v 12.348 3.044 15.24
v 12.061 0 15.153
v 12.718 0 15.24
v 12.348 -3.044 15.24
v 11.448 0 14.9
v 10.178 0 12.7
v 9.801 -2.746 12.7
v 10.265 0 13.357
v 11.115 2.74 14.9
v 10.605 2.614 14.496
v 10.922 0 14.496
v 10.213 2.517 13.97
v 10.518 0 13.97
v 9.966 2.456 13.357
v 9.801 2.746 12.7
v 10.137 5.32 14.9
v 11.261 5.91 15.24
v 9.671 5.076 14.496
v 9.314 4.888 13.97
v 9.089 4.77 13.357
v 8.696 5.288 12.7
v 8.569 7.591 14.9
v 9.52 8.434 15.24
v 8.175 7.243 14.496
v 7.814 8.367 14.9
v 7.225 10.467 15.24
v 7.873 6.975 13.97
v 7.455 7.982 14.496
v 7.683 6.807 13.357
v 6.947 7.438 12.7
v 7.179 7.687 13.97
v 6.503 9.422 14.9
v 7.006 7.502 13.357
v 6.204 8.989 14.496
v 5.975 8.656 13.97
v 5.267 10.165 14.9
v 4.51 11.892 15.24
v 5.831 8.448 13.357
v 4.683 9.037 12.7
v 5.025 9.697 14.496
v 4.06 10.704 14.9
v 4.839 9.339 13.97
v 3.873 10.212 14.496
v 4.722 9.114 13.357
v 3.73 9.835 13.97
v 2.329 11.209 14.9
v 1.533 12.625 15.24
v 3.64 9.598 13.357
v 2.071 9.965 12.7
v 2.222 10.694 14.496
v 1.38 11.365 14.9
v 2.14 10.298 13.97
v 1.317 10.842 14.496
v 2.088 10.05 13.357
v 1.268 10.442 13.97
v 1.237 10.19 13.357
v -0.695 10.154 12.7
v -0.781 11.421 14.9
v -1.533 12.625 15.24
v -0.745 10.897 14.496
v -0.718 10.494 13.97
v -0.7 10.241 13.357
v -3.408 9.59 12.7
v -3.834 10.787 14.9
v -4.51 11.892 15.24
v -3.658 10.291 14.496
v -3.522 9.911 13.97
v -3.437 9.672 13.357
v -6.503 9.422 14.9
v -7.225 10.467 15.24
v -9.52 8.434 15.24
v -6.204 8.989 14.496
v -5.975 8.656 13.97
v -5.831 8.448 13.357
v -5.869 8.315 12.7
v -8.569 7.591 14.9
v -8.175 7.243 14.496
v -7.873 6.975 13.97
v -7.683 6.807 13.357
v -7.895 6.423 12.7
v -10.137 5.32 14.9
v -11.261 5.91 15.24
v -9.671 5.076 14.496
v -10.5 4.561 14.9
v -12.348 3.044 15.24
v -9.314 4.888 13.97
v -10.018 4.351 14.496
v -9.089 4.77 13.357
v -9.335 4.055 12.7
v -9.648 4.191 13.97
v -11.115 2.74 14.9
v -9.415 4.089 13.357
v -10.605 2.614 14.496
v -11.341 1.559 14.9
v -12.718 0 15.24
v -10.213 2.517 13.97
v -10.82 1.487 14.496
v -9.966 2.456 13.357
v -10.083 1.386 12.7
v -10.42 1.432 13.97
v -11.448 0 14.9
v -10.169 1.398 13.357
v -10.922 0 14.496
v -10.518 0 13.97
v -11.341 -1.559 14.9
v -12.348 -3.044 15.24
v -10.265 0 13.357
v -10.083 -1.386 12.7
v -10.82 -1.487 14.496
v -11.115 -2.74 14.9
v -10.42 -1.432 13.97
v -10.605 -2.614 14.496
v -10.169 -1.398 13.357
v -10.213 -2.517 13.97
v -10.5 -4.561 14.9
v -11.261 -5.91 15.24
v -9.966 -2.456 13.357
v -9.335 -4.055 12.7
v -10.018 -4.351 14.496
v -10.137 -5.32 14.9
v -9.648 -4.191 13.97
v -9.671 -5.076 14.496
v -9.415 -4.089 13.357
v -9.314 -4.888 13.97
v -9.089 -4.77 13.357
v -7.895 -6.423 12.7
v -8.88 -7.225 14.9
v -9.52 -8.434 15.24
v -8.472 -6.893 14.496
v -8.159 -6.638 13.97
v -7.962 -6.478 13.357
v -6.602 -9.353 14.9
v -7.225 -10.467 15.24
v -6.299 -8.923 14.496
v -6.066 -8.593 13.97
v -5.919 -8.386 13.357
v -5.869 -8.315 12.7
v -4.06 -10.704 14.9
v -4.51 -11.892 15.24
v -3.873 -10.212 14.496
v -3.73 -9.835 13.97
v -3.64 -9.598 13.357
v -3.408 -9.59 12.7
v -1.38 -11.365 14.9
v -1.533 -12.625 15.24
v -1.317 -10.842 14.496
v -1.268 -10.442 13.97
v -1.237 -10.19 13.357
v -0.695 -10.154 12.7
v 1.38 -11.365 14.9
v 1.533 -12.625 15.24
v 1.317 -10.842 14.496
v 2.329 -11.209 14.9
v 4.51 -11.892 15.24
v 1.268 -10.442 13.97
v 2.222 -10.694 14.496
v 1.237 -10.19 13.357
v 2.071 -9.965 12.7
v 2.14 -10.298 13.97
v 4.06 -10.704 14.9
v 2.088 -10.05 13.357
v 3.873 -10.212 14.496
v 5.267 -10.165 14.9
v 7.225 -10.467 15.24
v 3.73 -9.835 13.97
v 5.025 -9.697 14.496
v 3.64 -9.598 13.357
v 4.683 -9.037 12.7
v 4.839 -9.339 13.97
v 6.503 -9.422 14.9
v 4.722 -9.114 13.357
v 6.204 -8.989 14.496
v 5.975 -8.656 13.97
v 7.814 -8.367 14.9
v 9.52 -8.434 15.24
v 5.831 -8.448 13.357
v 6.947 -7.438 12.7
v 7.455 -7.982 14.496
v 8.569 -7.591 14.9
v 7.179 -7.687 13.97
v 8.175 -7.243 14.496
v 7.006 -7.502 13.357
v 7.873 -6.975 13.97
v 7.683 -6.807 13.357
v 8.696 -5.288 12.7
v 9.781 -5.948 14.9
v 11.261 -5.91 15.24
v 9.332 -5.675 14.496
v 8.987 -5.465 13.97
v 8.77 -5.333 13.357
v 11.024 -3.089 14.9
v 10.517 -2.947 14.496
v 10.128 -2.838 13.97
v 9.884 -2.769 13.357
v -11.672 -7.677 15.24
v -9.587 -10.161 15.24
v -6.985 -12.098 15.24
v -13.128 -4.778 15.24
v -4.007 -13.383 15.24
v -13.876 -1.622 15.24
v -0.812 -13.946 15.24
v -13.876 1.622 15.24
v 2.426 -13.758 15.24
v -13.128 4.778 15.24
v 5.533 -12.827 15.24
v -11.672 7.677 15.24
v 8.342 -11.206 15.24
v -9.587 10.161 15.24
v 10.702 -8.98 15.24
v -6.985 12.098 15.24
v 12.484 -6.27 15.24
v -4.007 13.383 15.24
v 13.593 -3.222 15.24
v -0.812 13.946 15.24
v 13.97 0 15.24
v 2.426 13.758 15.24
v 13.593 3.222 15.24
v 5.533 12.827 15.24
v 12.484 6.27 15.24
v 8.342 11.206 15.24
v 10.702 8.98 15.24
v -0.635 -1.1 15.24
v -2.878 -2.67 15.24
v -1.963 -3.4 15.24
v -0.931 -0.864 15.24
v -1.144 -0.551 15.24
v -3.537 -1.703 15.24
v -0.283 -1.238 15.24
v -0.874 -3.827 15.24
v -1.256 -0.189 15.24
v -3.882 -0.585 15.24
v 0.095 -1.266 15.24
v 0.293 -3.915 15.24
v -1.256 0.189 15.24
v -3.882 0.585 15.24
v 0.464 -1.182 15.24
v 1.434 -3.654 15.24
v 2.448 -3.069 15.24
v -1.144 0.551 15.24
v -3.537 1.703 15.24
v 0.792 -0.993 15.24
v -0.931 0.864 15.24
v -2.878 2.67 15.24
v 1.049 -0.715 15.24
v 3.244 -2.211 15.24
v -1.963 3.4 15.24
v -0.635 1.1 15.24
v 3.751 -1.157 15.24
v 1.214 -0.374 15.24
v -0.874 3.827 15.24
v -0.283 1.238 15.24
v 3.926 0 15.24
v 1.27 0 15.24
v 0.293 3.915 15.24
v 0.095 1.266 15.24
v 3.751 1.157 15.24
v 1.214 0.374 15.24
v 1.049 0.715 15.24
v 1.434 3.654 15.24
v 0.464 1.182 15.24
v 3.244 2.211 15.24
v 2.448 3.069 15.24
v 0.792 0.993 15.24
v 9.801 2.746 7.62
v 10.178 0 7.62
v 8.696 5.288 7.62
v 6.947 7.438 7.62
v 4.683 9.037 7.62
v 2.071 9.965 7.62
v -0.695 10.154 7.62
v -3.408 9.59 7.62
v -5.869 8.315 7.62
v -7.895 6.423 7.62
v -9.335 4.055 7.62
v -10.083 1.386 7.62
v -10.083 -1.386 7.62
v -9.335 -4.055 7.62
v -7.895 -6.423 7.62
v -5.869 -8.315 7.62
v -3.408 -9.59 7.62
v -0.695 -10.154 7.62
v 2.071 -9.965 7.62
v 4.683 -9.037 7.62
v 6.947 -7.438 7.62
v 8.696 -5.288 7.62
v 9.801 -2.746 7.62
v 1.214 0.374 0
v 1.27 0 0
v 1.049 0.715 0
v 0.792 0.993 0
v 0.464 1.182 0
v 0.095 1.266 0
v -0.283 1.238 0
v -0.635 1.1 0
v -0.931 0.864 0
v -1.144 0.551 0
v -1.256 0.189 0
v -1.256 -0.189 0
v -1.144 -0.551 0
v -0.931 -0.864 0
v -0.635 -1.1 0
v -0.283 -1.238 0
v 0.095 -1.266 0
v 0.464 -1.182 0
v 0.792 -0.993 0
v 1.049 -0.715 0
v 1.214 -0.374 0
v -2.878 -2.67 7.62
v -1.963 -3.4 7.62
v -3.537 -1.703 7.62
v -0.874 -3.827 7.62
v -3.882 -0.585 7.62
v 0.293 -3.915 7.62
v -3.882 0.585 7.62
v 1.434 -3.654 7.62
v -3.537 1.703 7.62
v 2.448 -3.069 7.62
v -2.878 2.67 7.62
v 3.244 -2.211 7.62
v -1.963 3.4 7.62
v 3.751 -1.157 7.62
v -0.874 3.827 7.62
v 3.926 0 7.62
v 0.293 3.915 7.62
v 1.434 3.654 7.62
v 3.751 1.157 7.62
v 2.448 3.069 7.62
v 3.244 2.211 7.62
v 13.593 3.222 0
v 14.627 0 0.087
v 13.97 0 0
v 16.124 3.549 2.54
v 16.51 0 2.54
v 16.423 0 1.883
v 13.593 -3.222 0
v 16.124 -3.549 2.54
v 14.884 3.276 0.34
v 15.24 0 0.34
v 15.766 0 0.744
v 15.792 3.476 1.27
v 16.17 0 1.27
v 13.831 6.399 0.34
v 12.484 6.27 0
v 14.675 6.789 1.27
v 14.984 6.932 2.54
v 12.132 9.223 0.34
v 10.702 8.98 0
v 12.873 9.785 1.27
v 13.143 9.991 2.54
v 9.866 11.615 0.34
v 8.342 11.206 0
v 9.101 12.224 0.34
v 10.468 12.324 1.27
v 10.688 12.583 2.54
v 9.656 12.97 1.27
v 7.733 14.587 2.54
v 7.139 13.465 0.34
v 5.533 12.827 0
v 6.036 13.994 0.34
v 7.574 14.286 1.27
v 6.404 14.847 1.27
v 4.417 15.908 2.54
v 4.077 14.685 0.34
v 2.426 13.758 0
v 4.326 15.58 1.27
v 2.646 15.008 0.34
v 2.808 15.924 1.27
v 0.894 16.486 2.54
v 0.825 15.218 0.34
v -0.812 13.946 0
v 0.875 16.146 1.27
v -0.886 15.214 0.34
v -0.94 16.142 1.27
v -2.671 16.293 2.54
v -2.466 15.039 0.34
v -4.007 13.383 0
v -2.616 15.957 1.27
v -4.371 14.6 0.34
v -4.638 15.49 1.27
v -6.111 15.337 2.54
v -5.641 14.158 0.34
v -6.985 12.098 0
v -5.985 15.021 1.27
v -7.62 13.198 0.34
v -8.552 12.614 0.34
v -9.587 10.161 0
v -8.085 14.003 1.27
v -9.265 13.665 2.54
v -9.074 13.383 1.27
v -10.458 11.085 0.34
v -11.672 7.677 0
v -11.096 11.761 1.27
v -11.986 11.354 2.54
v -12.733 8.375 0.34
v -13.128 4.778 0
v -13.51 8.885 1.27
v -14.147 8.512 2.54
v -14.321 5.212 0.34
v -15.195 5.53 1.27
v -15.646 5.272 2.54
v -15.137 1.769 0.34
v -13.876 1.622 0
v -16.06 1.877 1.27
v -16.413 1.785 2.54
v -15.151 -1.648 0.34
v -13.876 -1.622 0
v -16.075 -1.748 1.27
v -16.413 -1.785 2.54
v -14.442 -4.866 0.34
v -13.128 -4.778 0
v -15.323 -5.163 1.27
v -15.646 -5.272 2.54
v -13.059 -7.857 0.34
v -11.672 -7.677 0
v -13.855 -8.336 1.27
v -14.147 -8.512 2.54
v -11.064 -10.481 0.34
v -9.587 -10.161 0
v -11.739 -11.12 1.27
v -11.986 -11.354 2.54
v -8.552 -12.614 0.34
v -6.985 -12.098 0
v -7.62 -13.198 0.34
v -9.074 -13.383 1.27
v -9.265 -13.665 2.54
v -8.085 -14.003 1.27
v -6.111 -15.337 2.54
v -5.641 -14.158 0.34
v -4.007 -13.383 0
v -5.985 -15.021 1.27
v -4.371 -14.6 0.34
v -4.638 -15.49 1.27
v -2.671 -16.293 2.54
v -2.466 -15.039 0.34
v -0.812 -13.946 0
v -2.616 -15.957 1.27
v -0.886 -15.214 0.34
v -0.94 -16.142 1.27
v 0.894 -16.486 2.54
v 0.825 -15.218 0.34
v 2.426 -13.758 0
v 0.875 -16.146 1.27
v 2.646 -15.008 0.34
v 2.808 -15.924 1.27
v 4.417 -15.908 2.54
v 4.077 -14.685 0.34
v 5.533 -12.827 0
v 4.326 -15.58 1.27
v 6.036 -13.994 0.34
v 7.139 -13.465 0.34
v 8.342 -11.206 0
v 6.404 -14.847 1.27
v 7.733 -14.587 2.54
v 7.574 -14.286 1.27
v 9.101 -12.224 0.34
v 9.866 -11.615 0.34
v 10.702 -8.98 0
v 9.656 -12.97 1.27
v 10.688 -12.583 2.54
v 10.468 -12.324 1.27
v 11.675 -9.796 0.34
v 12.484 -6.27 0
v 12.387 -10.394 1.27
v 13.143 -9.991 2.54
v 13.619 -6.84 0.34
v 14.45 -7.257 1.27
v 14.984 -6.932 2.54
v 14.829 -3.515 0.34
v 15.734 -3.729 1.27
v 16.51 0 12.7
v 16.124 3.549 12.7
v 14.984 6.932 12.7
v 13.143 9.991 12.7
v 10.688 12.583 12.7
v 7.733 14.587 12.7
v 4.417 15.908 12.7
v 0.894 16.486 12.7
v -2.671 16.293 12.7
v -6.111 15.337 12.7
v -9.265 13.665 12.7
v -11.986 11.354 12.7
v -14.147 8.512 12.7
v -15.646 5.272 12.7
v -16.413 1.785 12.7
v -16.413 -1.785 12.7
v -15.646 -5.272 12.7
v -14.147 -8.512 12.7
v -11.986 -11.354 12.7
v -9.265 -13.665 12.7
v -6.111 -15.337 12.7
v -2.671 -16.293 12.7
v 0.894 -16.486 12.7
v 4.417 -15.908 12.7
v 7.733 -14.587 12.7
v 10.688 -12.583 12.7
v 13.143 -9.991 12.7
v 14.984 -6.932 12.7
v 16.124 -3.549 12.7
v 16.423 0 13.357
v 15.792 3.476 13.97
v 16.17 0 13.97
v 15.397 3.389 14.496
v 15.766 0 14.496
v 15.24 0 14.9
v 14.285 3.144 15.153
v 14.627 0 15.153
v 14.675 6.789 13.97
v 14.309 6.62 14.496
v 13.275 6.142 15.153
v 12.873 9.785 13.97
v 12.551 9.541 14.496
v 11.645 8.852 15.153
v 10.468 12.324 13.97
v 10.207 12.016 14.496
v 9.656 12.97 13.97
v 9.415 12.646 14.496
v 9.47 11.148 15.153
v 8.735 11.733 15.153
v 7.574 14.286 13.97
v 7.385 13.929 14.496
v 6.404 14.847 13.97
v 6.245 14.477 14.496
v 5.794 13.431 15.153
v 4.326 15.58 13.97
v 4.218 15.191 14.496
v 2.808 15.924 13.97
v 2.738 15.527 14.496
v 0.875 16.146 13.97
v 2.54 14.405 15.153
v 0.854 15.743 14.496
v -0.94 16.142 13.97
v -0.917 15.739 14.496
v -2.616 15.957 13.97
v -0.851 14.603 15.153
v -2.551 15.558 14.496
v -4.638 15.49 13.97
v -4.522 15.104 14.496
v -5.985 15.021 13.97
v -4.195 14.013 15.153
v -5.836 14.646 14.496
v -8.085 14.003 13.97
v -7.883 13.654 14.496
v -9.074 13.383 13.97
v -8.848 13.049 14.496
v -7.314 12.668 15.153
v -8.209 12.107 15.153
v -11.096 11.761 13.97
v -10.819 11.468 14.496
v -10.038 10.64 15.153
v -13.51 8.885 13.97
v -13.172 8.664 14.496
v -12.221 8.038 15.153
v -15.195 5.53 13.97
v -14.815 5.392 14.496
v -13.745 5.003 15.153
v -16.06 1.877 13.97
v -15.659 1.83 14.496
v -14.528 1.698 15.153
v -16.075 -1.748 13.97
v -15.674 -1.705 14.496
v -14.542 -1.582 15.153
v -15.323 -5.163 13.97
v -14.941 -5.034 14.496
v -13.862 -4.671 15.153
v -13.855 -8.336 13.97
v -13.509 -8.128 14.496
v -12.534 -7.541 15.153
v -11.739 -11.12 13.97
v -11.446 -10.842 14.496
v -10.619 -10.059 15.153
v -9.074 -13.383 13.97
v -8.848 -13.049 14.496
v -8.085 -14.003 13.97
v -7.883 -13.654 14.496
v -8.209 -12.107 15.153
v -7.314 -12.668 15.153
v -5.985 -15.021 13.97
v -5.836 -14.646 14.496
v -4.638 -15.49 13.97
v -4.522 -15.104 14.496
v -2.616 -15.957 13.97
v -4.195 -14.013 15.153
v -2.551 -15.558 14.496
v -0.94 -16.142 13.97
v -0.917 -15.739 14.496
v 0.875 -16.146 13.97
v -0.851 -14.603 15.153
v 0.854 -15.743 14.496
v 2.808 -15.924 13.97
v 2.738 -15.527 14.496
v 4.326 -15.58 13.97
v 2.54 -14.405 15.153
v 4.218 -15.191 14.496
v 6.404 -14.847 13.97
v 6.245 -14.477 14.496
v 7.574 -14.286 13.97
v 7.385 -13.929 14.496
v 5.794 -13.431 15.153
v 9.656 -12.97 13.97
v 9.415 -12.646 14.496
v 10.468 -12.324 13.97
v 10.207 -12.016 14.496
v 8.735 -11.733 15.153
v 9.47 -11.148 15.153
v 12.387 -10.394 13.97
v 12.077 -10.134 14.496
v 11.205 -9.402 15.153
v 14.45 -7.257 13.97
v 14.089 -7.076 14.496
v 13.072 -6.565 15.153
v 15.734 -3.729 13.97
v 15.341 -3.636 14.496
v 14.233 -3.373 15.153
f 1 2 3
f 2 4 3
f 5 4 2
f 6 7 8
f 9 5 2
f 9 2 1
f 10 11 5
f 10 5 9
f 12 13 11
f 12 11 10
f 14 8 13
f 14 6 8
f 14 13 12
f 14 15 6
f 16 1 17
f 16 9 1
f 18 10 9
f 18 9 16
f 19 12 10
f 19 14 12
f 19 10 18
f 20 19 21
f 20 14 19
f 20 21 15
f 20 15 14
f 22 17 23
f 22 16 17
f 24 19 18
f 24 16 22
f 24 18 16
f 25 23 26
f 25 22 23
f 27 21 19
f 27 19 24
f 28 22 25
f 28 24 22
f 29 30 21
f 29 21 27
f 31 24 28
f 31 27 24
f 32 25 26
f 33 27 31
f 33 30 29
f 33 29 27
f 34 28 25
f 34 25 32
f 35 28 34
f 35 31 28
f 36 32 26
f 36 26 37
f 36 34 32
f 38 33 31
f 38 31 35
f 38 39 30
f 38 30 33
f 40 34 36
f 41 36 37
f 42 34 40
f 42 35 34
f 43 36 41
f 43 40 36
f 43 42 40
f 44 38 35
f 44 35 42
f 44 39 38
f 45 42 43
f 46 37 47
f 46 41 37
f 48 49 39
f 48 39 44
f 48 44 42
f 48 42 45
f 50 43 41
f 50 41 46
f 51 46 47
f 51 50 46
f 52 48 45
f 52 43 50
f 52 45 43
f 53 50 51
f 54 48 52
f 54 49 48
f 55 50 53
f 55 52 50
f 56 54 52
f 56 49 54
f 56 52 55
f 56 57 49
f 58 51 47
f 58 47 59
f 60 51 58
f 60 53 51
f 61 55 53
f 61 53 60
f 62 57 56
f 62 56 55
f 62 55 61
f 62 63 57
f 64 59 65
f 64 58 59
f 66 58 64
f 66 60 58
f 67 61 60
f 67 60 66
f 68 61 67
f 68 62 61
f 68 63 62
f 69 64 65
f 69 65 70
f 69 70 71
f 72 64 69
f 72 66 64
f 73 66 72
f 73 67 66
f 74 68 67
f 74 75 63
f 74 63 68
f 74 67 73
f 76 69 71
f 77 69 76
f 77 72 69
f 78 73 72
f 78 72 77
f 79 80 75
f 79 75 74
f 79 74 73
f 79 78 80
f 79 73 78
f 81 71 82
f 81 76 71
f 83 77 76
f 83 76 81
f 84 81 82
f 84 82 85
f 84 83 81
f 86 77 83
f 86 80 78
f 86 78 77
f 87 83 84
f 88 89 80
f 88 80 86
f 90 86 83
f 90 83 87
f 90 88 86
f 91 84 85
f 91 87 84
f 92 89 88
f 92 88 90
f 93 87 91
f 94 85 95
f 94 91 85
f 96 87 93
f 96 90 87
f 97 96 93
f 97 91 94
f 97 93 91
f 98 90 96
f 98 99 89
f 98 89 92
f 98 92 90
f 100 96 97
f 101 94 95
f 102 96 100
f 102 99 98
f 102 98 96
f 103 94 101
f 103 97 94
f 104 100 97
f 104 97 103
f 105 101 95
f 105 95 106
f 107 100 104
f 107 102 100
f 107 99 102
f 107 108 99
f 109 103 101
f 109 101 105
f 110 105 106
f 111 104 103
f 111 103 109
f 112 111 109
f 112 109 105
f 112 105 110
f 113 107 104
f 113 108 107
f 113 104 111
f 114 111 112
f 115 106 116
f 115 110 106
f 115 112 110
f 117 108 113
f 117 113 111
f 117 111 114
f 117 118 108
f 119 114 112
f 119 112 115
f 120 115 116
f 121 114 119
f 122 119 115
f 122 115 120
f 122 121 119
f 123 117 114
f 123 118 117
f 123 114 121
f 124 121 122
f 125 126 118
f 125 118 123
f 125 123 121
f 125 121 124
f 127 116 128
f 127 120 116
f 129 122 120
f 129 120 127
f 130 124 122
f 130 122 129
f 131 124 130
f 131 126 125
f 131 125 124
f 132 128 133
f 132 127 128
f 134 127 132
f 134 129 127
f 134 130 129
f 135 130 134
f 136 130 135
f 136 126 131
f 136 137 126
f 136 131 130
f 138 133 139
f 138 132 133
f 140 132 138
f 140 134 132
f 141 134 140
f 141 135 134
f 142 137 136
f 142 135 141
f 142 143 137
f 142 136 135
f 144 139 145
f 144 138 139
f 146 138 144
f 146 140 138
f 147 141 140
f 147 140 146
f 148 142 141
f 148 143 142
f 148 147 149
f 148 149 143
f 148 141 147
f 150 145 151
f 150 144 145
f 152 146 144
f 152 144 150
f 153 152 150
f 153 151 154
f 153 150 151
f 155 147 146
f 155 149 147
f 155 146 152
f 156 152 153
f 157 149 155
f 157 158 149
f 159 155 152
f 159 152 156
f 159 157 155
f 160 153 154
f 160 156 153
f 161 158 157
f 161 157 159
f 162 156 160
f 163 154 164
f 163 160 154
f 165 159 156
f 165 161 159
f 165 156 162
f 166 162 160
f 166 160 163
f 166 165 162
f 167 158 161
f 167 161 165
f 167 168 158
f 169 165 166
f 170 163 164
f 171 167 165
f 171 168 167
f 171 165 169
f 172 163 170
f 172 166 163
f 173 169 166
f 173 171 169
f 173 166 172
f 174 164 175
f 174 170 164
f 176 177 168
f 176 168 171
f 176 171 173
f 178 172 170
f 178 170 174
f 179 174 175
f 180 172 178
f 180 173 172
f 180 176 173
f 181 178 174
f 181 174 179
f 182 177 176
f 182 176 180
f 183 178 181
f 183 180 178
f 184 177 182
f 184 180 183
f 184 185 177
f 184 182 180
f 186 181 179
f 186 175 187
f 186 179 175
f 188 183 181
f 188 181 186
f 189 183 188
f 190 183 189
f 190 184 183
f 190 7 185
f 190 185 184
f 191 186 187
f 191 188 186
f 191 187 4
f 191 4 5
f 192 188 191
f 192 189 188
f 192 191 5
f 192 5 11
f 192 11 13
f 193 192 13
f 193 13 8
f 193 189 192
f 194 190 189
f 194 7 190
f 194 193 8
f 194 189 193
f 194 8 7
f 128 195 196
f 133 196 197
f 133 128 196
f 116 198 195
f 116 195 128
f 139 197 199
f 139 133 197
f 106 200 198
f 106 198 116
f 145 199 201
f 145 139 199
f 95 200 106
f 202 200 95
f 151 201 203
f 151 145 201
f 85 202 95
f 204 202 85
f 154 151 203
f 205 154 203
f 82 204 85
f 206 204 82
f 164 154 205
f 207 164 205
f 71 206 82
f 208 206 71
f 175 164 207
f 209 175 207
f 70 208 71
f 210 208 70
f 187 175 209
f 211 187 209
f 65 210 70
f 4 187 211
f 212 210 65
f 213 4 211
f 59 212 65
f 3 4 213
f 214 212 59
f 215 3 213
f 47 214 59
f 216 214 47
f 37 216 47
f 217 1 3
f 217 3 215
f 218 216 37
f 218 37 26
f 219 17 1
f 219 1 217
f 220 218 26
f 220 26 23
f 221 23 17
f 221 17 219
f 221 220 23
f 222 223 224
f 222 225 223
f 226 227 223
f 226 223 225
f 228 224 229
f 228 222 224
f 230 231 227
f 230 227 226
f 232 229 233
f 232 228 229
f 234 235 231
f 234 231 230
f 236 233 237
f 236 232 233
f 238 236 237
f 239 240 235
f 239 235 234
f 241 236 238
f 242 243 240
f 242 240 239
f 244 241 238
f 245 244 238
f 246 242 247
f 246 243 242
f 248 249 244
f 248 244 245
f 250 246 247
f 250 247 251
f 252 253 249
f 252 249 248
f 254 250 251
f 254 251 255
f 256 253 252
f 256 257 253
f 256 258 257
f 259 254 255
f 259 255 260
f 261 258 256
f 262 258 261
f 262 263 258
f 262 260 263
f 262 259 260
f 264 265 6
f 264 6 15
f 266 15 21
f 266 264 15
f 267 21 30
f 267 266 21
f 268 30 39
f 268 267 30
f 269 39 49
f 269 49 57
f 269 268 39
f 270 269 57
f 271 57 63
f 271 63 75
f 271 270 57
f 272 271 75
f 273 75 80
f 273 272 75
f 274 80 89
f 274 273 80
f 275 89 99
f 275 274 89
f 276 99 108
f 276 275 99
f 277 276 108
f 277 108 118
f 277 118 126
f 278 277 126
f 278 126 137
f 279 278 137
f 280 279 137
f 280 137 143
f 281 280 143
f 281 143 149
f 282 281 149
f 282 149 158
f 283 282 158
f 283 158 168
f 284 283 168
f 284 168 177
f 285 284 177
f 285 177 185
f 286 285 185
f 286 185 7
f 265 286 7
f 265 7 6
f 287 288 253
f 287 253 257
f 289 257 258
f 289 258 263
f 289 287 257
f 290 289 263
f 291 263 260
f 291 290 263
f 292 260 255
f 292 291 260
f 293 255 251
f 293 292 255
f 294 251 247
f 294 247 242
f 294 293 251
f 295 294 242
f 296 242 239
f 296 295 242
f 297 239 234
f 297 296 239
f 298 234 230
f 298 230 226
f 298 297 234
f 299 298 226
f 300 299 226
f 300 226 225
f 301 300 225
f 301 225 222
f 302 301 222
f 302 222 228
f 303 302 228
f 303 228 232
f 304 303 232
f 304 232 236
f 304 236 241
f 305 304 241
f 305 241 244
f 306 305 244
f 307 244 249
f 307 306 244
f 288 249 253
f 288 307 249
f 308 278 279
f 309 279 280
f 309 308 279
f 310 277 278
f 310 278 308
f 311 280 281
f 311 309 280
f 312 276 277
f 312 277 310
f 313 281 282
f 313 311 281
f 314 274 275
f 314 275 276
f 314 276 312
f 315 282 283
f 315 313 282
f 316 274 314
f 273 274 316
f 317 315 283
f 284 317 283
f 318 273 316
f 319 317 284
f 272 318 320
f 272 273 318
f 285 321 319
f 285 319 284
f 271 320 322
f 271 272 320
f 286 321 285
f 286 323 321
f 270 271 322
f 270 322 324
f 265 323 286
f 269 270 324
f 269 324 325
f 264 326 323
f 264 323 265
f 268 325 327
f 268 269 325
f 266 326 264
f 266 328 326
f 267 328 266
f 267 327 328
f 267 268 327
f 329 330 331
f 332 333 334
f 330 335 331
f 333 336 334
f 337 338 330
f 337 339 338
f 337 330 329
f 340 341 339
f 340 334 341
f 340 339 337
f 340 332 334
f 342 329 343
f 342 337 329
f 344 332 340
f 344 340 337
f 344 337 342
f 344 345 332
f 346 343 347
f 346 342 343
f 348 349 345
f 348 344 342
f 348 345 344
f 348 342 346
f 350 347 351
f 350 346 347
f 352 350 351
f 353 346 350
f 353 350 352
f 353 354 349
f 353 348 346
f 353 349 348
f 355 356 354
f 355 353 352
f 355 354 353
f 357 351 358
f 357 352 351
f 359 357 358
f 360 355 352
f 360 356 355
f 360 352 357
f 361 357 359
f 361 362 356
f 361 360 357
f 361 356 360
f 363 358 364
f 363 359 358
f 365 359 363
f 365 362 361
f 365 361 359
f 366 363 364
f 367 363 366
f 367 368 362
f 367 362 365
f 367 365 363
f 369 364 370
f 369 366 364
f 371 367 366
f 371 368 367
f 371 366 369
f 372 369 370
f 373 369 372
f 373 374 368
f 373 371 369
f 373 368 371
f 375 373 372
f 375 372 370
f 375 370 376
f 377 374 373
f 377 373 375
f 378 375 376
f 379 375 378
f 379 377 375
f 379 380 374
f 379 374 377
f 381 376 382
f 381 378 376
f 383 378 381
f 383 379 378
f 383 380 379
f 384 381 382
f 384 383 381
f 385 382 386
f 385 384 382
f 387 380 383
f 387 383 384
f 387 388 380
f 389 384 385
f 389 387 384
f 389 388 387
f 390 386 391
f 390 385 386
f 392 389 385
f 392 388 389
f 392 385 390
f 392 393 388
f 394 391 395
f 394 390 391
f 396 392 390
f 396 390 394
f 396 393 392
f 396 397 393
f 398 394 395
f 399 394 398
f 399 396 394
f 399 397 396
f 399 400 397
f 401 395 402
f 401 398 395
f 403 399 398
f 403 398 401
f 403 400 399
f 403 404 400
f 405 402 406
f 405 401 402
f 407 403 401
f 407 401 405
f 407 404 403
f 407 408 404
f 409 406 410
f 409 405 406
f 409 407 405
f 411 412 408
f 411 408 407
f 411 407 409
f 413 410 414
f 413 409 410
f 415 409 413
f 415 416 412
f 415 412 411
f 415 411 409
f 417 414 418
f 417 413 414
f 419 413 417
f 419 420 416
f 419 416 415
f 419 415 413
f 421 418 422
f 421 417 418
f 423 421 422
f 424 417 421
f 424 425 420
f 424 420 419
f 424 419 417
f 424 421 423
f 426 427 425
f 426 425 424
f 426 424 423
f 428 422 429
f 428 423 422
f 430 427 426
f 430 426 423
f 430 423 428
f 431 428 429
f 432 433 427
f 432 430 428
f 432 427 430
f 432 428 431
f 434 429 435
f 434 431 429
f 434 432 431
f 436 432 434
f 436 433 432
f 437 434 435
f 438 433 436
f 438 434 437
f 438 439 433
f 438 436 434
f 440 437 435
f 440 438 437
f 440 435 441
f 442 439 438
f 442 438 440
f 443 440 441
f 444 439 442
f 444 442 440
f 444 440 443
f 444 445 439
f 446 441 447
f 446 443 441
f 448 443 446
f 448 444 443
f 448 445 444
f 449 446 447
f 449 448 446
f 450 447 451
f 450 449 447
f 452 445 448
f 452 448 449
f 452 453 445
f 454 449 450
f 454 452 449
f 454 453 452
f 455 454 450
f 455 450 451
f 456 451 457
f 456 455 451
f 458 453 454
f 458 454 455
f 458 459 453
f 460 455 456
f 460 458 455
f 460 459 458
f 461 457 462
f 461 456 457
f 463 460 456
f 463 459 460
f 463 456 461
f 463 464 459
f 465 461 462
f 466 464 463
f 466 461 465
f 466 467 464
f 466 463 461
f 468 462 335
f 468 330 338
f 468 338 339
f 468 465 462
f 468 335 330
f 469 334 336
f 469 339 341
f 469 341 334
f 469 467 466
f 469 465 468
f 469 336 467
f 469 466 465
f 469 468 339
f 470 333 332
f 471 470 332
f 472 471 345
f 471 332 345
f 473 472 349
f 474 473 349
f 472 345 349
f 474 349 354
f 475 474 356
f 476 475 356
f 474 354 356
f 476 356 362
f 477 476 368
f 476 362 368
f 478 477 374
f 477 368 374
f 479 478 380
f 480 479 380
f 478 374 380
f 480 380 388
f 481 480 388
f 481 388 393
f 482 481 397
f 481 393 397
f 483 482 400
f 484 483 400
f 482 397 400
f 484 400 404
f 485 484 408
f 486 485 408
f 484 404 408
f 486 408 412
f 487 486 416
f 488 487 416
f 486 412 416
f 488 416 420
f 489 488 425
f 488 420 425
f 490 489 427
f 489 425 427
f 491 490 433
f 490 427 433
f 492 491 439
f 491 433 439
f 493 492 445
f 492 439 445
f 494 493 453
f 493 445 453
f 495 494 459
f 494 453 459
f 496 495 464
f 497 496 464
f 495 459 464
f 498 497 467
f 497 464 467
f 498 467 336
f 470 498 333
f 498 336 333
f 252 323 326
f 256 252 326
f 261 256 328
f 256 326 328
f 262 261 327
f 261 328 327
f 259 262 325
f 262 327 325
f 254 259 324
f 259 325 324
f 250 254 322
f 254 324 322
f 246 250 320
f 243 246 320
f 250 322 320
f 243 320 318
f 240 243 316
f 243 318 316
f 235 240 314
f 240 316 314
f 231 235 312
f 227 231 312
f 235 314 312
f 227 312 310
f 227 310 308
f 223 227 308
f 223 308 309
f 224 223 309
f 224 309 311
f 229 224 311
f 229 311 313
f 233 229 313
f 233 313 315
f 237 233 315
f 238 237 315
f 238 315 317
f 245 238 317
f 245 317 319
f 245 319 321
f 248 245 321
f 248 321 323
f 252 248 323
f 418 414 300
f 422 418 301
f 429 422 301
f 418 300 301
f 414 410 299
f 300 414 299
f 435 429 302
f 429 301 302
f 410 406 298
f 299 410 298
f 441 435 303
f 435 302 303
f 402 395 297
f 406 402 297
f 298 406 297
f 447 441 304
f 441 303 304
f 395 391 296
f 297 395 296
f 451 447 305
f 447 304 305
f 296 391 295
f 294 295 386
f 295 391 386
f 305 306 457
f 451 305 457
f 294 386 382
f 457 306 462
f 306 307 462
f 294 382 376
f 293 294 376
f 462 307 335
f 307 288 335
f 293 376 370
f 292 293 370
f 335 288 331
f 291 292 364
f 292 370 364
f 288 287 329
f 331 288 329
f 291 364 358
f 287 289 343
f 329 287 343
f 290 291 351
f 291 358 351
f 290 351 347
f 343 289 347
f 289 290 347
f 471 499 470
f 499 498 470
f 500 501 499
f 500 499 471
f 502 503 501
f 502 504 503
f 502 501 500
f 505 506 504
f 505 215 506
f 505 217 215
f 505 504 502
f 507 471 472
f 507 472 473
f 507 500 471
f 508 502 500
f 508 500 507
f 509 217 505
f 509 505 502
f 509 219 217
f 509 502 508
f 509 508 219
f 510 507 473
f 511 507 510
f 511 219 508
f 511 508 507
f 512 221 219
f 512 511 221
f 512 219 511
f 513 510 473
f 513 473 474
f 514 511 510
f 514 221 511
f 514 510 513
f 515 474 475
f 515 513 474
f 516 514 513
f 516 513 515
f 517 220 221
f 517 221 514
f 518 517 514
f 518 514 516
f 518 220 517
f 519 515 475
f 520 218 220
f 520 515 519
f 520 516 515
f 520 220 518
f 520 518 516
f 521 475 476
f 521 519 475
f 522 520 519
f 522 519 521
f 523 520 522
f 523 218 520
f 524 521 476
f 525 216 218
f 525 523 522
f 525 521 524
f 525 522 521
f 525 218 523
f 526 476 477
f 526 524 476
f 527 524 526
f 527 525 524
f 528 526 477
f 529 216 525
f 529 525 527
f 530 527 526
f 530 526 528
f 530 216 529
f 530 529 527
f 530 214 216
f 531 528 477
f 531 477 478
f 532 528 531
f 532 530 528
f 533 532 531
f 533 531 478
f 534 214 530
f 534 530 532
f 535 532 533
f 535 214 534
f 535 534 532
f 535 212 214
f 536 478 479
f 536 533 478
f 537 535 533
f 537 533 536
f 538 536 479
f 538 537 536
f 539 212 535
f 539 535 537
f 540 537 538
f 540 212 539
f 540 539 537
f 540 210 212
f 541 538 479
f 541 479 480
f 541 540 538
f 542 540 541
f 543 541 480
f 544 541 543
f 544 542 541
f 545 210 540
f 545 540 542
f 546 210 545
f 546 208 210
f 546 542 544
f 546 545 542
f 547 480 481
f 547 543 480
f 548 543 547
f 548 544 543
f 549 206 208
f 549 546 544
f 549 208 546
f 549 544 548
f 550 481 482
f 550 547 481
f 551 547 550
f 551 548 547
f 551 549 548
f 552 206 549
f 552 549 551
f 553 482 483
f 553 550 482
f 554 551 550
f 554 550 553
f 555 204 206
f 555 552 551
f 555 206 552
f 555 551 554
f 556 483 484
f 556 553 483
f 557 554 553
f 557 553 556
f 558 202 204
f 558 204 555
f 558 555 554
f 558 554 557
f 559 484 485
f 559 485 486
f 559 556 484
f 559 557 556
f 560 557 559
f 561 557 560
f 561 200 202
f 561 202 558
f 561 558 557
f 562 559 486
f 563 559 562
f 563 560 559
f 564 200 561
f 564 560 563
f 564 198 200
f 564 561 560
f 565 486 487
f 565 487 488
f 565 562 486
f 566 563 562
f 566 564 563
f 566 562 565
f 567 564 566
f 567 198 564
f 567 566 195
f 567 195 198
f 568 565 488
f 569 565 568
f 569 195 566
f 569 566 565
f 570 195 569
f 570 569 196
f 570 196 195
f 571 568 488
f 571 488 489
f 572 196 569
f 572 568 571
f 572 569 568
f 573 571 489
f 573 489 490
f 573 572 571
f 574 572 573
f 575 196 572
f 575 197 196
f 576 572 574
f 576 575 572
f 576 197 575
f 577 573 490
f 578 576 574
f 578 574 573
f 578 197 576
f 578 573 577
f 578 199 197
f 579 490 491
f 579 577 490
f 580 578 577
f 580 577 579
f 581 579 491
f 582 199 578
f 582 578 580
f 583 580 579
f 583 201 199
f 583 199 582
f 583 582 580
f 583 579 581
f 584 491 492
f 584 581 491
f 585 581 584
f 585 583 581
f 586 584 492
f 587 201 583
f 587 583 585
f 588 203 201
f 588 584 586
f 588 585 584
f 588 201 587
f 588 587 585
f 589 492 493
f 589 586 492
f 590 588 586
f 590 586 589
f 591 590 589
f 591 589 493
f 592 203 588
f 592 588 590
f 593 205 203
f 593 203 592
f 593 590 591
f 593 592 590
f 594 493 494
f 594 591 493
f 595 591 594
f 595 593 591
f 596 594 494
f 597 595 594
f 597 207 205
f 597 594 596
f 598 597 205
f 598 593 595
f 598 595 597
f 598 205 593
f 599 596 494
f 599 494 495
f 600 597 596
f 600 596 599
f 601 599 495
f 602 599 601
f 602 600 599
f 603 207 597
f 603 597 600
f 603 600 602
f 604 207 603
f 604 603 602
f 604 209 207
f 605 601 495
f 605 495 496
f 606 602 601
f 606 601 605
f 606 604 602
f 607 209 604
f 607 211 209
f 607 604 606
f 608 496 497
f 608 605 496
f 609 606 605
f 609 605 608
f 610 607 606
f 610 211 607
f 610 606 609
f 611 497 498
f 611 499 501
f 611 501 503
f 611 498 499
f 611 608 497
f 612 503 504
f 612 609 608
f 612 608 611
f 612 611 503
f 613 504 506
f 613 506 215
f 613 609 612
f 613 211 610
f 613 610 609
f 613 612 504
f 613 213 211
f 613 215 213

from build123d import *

# Parameters (mm, degrees)
F0_R     = 16.51
F0_R_2   = 10.1780603176
F1_DEPTH = 15.24
F0_R_3   = 3.9258092534
F0_R_4   = 1.27
F2_DEPTH = 7.62
F3_R     = 2.54


with BuildPart() as f1:
    # F0 (on Top) → F1 (new body)
    with BuildSketch(Plane.XY):
        Circle(F0_R)
        Circle(F0_R_2, mode=Mode.SUBTRACT)
    extrude(amount=F1_DEPTH)



with BuildPart() as f1b:
    # F0 (on Top) → F1, piece 2 (new body)
    with BuildSketch(Plane.XY):
        Circle(F0_R_3)
        Circle(F0_R_4, mode=Mode.SUBTRACT)
    extrude(amount=F1_DEPTH)


with BuildPart() as f1_1:
    add(f1.part)

    add(f1b.part)  # F2 merges F1b
    # F0 (on Top) → F2 (join)
    with BuildSketch(Plane.XY):
        Circle(F0_R_2)
        Circle(F0_R_3, mode=Mode.SUBTRACT)
    extrude(amount=F2_DEPTH)

    # F3
    f3_edges = [f1_1.edges().sort_by_distance(p)[0] for p in [
        (-16.51, 0, 15.24),
        (-16.51, 0, 0),
        (-10.17806, 0, 15.24),
    ]]
    fillet(f3_edges, radius=F3_R)


solid = f1_1.part
